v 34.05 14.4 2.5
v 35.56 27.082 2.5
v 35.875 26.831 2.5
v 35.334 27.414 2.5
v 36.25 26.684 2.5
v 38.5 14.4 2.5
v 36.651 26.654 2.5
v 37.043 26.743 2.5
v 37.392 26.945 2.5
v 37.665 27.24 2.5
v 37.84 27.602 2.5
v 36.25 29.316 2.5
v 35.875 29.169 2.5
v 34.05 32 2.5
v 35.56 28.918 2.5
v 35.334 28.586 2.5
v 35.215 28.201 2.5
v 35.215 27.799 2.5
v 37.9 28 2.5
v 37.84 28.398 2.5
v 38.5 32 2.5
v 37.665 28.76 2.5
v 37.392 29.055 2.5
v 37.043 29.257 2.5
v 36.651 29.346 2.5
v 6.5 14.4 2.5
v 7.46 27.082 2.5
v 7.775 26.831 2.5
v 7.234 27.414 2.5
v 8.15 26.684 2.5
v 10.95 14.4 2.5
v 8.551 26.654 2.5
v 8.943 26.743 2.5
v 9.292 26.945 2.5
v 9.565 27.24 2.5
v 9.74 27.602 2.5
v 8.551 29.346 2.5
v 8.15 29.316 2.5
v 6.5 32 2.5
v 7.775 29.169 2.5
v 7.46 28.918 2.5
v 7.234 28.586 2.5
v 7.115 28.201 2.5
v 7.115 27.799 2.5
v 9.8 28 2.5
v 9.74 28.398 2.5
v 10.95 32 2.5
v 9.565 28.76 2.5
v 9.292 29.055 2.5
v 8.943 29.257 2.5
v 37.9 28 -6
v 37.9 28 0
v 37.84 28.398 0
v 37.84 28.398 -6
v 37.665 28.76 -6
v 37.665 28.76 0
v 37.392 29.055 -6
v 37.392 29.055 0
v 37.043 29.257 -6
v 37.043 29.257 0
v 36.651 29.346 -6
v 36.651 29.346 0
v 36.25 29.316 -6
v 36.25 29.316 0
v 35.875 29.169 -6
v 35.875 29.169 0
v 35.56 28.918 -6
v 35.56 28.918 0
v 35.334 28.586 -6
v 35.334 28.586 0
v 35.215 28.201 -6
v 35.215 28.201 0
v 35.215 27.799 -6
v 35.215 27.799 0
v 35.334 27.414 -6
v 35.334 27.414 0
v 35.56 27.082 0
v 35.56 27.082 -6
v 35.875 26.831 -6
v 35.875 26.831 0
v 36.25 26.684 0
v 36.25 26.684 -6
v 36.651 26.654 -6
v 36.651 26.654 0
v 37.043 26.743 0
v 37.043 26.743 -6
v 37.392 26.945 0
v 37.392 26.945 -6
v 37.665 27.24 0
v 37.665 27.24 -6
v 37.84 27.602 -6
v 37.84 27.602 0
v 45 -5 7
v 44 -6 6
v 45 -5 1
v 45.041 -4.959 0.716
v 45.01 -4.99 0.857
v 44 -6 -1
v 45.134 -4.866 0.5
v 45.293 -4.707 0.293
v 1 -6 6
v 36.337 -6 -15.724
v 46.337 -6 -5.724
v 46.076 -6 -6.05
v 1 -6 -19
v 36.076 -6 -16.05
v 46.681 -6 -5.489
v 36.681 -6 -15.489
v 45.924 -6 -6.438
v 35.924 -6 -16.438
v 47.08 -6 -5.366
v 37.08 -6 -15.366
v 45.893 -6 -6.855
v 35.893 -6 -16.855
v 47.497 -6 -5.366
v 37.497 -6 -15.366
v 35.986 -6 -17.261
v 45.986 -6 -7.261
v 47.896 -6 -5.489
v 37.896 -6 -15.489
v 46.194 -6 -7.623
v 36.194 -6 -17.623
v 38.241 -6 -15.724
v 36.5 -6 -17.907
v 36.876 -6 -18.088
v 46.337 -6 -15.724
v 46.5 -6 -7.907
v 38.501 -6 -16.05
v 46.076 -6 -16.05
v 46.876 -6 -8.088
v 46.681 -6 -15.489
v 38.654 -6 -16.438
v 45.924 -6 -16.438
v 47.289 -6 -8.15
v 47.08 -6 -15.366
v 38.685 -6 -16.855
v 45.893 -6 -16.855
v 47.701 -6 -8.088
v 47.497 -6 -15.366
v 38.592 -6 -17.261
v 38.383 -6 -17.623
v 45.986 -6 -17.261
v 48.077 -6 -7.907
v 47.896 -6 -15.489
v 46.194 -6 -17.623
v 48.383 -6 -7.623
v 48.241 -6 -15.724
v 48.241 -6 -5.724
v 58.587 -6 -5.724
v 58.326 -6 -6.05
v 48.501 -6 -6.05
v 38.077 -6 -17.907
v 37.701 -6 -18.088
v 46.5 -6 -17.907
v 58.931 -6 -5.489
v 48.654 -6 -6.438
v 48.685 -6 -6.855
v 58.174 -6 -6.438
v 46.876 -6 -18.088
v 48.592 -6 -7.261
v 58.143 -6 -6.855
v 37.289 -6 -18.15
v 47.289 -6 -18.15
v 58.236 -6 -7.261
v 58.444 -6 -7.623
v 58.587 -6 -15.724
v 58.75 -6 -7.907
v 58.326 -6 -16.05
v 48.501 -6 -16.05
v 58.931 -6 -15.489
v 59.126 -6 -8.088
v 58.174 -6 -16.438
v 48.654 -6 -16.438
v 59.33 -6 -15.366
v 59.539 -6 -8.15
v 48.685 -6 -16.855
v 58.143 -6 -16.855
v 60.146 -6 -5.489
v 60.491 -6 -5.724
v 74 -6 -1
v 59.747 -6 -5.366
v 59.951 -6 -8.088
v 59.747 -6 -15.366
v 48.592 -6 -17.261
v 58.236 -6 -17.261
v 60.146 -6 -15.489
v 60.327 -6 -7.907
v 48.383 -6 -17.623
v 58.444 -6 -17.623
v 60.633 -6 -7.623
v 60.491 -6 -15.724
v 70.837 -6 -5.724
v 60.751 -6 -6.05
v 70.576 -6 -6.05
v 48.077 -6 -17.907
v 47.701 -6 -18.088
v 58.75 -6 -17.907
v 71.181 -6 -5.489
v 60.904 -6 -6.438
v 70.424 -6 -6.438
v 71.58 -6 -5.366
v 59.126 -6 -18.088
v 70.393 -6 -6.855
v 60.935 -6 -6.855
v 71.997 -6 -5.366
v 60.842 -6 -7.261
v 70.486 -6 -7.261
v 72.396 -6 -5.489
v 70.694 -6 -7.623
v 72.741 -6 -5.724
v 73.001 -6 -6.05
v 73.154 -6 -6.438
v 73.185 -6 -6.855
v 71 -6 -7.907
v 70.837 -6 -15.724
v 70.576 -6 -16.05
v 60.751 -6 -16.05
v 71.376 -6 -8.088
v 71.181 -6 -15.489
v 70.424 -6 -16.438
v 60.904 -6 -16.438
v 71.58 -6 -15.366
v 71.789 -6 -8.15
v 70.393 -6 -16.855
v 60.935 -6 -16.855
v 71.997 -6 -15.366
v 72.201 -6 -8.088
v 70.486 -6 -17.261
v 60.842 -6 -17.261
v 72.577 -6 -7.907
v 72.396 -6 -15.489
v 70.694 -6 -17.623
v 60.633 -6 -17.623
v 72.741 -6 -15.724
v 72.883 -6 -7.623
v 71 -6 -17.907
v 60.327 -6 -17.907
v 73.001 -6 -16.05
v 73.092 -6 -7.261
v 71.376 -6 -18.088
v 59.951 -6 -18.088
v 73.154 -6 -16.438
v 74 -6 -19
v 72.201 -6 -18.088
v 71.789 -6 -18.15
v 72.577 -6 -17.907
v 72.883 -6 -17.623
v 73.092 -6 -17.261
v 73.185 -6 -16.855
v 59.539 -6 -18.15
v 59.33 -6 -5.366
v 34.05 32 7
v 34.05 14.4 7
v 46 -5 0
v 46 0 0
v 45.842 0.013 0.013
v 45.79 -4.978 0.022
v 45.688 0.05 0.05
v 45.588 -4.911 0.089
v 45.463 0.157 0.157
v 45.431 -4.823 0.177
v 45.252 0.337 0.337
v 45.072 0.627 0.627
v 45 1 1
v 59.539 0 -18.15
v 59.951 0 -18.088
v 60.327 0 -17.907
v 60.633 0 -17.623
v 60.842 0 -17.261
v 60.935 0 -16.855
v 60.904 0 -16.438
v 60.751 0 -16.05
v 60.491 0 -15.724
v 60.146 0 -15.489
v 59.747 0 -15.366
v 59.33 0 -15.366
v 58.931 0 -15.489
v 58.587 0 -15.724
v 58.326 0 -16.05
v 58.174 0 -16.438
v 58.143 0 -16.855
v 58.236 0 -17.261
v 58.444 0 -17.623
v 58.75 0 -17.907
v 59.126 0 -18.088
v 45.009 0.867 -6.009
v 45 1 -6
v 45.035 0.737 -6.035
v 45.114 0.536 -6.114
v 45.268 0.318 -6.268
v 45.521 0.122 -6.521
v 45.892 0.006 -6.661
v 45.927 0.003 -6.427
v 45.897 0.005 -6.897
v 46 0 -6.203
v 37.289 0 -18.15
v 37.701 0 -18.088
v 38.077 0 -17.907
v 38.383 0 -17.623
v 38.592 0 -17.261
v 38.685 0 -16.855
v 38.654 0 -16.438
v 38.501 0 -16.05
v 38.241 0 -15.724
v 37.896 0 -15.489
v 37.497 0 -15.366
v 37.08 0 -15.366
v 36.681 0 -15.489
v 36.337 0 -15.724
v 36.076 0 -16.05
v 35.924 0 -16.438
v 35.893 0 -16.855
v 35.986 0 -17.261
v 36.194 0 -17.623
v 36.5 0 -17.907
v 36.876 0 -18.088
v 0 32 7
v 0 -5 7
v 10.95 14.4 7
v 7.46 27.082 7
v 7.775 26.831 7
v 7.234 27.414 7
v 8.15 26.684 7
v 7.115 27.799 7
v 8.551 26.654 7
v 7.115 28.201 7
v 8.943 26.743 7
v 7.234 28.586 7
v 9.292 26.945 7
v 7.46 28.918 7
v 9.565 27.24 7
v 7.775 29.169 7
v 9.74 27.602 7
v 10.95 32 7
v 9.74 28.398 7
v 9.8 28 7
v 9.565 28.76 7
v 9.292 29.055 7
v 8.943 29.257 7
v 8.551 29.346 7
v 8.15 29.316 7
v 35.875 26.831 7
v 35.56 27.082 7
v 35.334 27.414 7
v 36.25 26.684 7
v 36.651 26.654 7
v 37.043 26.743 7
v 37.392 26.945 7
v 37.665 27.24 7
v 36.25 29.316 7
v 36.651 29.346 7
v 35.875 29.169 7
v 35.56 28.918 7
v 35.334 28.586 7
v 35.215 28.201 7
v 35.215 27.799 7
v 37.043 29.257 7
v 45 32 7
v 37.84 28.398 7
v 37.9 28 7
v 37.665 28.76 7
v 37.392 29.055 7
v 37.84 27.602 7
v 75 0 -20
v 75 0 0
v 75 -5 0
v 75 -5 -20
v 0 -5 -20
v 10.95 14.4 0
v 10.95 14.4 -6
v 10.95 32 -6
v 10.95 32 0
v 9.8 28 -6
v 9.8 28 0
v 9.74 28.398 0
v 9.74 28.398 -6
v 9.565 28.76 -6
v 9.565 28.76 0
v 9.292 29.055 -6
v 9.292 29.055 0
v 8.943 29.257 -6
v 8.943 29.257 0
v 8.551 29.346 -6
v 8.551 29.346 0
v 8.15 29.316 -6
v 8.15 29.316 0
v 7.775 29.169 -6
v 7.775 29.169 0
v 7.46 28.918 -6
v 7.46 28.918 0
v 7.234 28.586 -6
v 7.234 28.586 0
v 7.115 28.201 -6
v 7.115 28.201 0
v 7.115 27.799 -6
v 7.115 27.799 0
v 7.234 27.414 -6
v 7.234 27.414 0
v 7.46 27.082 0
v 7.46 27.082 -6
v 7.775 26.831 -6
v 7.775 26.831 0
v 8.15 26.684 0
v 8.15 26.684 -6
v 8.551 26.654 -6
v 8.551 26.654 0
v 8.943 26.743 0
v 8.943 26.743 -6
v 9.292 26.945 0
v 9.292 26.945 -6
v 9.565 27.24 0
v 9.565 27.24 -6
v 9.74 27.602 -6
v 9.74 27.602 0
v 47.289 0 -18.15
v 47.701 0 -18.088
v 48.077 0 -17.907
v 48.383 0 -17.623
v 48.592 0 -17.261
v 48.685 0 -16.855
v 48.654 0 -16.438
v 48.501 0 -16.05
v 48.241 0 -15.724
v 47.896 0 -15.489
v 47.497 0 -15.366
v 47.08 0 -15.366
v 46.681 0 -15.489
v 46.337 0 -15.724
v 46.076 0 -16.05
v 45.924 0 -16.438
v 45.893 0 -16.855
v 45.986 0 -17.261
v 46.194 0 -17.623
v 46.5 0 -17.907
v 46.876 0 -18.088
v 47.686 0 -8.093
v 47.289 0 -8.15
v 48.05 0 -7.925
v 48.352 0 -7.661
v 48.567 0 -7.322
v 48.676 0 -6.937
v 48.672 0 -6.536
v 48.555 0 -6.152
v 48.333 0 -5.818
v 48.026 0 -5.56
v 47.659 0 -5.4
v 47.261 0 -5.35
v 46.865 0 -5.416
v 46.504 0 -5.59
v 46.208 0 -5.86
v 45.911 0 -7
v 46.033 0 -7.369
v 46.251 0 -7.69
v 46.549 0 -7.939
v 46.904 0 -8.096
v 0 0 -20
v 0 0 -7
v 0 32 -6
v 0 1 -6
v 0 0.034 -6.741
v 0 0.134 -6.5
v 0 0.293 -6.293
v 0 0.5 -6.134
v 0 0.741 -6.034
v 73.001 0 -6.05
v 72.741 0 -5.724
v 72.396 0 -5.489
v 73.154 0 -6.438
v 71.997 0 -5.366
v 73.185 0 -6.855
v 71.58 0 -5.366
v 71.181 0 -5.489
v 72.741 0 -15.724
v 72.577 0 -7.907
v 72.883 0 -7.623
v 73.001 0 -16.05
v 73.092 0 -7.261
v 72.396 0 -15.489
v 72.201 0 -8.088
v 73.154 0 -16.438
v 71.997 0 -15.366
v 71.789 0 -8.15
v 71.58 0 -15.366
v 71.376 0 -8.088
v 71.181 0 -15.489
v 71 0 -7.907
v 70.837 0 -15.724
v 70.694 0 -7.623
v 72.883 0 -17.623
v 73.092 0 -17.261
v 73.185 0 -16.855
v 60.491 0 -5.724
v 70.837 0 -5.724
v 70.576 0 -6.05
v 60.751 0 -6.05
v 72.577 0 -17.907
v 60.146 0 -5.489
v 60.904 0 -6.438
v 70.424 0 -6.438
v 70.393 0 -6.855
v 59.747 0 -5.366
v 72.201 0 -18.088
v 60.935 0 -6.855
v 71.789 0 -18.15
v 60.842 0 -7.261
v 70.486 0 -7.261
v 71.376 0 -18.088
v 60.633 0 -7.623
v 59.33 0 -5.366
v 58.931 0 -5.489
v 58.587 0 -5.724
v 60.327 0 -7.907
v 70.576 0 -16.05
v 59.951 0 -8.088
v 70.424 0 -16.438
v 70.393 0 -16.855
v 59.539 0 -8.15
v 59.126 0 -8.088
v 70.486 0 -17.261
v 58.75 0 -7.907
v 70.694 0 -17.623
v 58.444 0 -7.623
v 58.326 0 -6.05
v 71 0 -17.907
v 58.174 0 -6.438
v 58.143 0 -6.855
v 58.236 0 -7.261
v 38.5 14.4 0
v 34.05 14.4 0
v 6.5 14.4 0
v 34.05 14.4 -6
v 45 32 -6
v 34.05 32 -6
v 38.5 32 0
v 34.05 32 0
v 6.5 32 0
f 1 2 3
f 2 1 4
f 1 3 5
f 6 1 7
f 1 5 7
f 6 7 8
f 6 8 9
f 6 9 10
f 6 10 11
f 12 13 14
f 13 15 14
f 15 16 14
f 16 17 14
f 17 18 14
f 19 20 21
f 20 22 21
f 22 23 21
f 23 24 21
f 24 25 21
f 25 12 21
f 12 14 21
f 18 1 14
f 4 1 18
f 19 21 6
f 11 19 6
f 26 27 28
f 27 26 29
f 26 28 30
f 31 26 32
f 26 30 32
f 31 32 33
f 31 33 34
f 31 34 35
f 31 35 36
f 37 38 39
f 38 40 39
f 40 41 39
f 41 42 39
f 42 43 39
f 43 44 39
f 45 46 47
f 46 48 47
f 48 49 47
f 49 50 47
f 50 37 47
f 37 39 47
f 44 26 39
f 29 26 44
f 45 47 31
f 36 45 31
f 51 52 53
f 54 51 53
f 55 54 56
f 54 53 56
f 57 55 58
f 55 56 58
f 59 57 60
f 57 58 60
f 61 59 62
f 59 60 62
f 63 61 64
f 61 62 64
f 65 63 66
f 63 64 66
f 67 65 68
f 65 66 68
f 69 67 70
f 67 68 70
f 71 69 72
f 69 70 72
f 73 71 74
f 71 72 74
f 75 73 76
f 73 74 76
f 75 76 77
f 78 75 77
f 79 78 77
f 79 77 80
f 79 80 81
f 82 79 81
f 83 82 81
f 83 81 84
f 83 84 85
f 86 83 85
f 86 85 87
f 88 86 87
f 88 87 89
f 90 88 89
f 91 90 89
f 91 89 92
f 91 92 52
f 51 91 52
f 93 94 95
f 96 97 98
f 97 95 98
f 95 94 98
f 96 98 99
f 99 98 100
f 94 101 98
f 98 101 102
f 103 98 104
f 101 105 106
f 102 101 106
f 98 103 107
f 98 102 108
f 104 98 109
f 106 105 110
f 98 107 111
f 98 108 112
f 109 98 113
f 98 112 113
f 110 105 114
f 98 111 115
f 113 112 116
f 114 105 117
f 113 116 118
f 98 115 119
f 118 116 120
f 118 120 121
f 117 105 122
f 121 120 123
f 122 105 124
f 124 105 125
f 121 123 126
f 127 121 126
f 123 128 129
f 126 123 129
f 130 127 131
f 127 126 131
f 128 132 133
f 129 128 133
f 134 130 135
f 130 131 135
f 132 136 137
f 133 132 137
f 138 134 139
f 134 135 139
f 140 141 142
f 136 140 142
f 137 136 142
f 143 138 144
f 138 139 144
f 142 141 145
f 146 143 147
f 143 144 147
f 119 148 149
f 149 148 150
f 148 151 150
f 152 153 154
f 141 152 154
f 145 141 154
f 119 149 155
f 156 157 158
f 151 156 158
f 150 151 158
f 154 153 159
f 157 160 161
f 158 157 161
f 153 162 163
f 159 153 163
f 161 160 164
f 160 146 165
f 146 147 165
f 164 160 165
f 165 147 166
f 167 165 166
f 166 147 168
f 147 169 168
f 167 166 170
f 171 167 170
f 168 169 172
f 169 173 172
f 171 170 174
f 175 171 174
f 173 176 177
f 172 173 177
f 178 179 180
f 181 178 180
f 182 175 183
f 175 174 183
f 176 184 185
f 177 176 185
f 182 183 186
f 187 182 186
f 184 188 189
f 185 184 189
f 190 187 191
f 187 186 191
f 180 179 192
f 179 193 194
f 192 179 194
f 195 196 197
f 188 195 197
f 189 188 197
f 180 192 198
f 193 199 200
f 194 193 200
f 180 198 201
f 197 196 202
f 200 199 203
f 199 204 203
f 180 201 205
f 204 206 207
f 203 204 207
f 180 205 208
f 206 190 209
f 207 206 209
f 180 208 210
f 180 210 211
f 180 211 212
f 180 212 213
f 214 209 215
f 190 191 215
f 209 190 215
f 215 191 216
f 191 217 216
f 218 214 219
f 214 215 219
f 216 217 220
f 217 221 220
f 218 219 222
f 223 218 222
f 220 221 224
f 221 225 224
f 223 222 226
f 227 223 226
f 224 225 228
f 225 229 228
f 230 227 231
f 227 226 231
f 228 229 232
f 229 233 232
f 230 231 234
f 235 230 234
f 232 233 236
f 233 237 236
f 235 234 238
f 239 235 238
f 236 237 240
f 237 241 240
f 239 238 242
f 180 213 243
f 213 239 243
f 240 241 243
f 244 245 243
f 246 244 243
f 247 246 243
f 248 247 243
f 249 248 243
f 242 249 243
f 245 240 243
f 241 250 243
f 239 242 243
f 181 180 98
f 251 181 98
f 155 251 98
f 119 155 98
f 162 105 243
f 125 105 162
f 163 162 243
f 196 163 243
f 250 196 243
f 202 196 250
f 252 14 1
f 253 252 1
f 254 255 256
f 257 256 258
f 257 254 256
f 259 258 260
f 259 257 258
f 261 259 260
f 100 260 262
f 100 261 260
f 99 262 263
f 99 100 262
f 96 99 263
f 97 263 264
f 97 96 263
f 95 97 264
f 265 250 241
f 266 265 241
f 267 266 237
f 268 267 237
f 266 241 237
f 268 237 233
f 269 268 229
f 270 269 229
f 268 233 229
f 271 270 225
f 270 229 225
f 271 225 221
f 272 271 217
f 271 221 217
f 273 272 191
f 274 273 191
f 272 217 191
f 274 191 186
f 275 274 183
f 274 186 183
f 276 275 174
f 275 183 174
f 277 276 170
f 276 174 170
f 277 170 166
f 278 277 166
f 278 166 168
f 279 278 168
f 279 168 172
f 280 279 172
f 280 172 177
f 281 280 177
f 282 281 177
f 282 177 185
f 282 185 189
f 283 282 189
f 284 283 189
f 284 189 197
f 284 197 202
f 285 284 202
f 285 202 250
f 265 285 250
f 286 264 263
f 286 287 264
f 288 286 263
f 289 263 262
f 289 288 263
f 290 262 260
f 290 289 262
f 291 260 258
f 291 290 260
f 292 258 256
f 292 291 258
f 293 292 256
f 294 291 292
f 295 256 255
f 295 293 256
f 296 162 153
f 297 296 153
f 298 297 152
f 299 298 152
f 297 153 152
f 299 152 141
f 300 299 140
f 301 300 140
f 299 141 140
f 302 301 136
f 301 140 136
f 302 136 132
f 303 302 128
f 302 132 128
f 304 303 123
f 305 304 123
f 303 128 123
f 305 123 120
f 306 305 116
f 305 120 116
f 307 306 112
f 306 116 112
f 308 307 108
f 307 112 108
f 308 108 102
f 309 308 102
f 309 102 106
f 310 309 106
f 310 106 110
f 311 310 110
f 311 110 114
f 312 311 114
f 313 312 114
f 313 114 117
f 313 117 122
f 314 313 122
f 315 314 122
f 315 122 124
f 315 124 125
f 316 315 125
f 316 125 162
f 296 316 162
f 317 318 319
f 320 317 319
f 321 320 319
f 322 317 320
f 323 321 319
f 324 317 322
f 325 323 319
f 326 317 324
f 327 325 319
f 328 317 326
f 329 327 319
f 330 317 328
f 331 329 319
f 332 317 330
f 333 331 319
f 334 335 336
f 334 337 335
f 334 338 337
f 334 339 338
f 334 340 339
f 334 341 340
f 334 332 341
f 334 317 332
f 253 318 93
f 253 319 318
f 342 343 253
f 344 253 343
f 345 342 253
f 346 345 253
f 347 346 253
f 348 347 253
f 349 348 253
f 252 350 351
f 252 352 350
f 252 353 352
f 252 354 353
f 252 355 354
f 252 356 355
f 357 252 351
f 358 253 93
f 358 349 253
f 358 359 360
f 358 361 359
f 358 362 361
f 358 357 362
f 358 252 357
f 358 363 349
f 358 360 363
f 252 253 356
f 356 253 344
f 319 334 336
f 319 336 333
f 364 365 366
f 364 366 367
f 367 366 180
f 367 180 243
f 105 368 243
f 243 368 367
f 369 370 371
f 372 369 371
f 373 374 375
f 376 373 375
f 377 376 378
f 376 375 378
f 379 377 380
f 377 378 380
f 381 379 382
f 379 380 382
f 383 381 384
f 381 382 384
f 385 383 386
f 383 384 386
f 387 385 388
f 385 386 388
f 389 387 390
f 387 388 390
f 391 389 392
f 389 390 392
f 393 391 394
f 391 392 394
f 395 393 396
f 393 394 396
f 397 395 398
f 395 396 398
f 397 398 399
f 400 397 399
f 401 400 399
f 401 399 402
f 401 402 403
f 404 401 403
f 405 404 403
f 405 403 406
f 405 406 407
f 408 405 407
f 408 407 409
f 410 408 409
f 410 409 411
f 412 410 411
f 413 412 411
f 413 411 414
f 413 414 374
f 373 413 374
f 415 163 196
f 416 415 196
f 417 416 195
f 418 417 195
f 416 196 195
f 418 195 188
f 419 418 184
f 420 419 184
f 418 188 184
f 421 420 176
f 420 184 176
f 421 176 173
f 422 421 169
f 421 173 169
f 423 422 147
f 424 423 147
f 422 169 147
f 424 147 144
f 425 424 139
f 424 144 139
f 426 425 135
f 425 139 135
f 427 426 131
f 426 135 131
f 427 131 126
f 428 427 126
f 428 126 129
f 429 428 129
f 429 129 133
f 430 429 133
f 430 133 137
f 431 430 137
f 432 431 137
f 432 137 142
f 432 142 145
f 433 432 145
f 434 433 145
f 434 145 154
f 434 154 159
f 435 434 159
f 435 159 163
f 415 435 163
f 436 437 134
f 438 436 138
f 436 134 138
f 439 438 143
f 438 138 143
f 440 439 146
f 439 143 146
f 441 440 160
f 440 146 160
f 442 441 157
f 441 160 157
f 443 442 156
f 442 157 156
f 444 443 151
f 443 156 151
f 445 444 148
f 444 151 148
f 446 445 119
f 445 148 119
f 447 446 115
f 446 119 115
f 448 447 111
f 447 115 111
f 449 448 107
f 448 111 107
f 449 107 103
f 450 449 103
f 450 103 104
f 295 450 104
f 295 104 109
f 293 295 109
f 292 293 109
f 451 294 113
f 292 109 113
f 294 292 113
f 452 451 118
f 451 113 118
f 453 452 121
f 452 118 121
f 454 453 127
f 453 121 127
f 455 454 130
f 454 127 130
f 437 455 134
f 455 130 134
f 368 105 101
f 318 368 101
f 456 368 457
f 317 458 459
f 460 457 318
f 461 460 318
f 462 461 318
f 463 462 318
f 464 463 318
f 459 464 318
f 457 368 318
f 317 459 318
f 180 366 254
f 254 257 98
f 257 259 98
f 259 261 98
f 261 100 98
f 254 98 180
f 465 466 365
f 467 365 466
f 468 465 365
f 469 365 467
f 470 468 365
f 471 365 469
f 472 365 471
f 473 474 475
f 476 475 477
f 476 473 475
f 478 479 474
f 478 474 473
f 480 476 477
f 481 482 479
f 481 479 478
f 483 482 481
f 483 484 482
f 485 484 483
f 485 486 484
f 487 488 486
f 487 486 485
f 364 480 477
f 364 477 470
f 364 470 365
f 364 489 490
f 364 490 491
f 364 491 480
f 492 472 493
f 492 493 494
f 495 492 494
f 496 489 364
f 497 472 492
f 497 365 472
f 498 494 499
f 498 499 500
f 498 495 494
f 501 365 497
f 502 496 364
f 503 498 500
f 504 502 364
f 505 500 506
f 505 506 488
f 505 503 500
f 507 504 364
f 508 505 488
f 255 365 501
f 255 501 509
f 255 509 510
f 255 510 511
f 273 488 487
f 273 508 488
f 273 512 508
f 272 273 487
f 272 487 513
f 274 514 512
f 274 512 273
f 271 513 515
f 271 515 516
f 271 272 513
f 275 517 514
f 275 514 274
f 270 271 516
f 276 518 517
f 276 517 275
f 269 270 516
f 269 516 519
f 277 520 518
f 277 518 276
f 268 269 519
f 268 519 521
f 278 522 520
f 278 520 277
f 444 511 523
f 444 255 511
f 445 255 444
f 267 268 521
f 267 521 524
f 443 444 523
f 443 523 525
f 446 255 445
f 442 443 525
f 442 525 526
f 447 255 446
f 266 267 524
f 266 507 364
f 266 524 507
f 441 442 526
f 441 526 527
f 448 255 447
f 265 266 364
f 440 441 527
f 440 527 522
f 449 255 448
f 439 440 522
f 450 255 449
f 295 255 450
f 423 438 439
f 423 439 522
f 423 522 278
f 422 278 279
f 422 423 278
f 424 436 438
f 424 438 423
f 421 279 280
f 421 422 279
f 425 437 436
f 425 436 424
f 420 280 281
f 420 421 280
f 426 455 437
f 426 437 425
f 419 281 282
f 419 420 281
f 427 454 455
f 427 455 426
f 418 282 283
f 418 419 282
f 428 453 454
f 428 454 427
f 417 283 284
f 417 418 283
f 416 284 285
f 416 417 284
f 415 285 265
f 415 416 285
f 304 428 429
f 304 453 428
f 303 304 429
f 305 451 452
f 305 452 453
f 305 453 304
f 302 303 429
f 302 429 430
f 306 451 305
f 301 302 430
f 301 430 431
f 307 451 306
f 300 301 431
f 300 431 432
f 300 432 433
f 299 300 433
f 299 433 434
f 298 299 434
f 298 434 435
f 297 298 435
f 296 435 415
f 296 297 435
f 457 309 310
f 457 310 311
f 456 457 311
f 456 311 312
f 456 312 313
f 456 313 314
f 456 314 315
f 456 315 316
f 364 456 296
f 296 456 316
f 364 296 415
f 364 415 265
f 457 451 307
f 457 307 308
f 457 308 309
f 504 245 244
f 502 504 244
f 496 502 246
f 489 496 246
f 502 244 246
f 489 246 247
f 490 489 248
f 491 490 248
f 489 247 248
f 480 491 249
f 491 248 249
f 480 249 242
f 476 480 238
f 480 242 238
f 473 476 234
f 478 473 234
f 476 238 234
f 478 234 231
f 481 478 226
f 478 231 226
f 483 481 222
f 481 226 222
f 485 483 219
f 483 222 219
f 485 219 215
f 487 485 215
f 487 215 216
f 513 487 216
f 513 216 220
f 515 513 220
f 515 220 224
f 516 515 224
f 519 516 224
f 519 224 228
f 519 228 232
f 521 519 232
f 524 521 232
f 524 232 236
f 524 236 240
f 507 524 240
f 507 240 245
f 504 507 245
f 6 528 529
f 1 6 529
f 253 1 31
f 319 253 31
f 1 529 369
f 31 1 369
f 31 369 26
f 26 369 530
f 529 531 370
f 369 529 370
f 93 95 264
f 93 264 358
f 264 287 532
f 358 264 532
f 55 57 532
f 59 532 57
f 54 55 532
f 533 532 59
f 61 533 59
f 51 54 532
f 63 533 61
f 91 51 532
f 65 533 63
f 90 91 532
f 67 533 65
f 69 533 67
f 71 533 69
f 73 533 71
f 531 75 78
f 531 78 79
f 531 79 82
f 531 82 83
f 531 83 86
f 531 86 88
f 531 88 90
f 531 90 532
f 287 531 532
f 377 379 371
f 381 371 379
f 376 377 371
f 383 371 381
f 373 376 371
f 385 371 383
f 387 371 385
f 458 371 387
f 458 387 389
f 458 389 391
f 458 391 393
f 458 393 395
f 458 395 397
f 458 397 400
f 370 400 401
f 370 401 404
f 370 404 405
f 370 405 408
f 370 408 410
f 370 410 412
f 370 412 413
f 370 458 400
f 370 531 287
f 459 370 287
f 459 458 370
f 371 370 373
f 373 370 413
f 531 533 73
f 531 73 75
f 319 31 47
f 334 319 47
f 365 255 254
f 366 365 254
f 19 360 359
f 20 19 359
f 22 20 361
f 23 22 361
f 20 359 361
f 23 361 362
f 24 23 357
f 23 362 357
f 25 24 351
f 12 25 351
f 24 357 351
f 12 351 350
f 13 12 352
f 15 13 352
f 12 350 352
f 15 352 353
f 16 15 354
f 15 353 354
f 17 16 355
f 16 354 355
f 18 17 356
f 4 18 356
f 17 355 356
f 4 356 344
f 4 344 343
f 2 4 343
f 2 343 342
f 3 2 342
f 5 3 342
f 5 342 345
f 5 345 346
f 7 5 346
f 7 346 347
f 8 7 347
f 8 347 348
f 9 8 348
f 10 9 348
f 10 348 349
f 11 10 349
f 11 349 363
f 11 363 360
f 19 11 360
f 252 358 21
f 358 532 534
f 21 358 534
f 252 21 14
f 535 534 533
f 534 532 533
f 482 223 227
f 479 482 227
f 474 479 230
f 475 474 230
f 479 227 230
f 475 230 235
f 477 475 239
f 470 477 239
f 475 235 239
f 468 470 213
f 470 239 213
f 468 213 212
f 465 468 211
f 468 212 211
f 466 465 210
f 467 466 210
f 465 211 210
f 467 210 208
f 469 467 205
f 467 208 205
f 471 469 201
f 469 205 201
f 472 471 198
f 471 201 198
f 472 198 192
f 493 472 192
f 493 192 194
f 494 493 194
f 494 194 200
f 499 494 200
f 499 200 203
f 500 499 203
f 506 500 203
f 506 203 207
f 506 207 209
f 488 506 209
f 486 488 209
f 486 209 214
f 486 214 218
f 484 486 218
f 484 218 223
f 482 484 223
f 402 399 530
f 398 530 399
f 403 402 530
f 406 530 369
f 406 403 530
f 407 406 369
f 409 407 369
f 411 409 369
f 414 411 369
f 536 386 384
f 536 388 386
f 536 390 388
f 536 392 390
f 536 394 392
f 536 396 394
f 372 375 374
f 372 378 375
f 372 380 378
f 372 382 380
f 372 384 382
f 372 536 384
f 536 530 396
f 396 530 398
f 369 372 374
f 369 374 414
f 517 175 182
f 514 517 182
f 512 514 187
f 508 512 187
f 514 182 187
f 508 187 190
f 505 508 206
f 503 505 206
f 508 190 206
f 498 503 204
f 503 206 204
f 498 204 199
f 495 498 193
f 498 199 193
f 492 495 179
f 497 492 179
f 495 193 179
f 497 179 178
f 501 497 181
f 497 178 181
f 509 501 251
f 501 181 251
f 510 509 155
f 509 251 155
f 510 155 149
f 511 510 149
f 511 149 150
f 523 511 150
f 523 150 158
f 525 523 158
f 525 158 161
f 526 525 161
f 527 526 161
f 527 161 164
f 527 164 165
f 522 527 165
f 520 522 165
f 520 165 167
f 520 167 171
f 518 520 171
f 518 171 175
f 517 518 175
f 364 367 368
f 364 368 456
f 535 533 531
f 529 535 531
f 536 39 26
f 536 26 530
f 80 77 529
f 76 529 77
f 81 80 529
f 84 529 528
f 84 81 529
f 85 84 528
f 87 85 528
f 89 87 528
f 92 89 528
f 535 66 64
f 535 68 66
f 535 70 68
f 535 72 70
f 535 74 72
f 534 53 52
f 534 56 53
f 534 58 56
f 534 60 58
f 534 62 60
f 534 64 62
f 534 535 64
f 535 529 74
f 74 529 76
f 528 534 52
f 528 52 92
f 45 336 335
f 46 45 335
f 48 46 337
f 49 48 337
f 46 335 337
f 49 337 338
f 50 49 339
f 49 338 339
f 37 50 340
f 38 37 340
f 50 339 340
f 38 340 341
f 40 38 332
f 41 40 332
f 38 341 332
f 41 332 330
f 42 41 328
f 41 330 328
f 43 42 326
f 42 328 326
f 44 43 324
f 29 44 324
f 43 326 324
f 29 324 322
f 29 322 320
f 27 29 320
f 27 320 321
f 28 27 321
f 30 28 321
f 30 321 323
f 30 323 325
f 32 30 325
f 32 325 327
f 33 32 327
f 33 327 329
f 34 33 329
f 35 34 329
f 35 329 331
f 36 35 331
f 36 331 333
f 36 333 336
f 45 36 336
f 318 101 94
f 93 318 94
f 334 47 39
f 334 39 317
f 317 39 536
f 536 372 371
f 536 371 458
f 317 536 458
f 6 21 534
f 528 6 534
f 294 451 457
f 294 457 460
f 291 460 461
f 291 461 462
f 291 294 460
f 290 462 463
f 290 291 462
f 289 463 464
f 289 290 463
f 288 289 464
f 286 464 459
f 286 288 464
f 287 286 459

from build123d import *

# Parameters (mm, degrees)
SKETCH1_W           = 45
SKETCH1_H           = 6
BOSS_EXTRUDE1_DEPTH = 32
SKETCH2_W           = 23.1
SKETCH2_H           = 17.6
CUT_EXTRUDE1_DEPTH  = 56.542776308
SKETCH3_W           = 45
SKETCH3_H           = 20
BOSS_EXTRUDE2_DEPTH = 6
SKETCH4_W           = 20
SKETCH4_H           = 6
BOSS_EXTRUDE3_DEPTH = 30
SKETCH5_R           = 1.4
CUT_EXTRUDE2_DEPTH  = 87.423376467
BOSS_EXTRUDE4_DEPTH = 7
SKETCH7_W           = 32
SKETCH7_H           = 2.5
CUT_EXTRUDE3_DEPTH  = 17.6
SKETCH8_R           = 1.35
CUT_EXTRUDE4_DEPTH  = 86.895285086
CHAMFER1_SIZE       = 1
FILLET1_R           = 1


with BuildPart() as part:
    # Sketch1 → Boss-Extrude1 (new body)
    with BuildSketch(Plane(origin=(0, 0, 0), x_dir=(1, 0, 0), z_dir=(0, 1, 0))):
        with Locations((22.5, 3)):
            Rectangle(SKETCH1_W, SKETCH1_H)
    extrude(amount=BOSS_EXTRUDE1_DEPTH)

    # Sketch2 → Cut-Extrude1 (cut, through all)
    with BuildSketch(Plane.XY):
        with Locations((22.5, 23.2)):
            Rectangle(SKETCH2_W, SKETCH2_H)
    extrude(amount=-CUT_EXTRUDE1_DEPTH, mode=Mode.SUBTRACT)

    # Sketch3 → Boss-Extrude2 (add)
    with BuildSketch(Plane.XZ):
        with Locations((22.5, -10)):
            Rectangle(SKETCH3_W, SKETCH3_H)
    extrude(amount=BOSS_EXTRUDE2_DEPTH)

    # Sketch4 → Boss-Extrude3 (add)
    with BuildSketch(Plane(origin=(45, 0, 0), x_dir=(0, 0, -1), z_dir=(1, 0, 0))):
        with Locations((10, -3)):
            Rectangle(SKETCH4_W, SKETCH4_H)
    extrude(amount=BOSS_EXTRUDE3_DEPTH)

    # Sketch5 → Cut-Extrude2 (cut, through all)
    with BuildSketch(Plane.XZ.offset(6)):
        with Locations(Location((37.288839919, -16.75, 0), (0, 0, 270))):
            Circle(SKETCH5_R)
        with Locations(Location((47.288839919, -16.75, 0), (0, 0, 270))):
            Circle(SKETCH5_R)
        with Locations(Location((47.288839919, -6.75, 0), (0, 0, 270))):
            Circle(SKETCH5_R)
        with Locations(Location((59.538839919, -16.75, 0), (0, 0, 270))):
            Circle(SKETCH5_R)
        with Locations(Location((71.788839919, -16.75, 0), (0, 0, 270))):
            Circle(SKETCH5_R)
        with Locations(Location((71.788839919, -6.75, 0), (0, 0, 270))):
            Circle(SKETCH5_R)
        with Locations(Location((59.538839919, -6.75, 0), (0, 0, 270))):
            Circle(SKETCH5_R)
    extrude(amount=-CUT_EXTRUDE2_DEPTH, mode=Mode.SUBTRACT)

    # Sketch6 → Boss-Extrude4 (add)
    with BuildSketch(Plane.XY):
        Polygon((0, 32), (0, -6), (45, -6), (45, 0), (45, 32), (34.05, 32), (34.05, 14.4), (10.95, 14.4), (10.95, 32), align=None)
    extrude(amount=BOSS_EXTRUDE4_DEPTH)

    # Sketch7 → Cut-Extrude3 (cut)
    with BuildSketch(Plane(origin=(0, 32, 0), x_dir=(1, 0, 0), z_dir=(0, 1, 0))):
        with Locations((22.5, -1.25)):
            Rectangle(SKETCH7_W, SKETCH7_H)
    extrude(amount=-CUT_EXTRUDE3_DEPTH, mode=Mode.SUBTRACT)

    # Sketch8 → Cut-Extrude4 (cut, through all)
    with BuildSketch(Plane.XY.offset(7)):
        with Locations((8.45, 28)):
            Circle(SKETCH8_R)
        with Locations((36.55, 28)):
            Circle(SKETCH8_R)
    extrude(amount=-CUT_EXTRUDE4_DEPTH, mode=Mode.SUBTRACT)

    # Chamfer1
    chamfer1_edges = [part.edges().sort_by_distance(p)[0] for p in [
        (22.5, -6, 7),
        (0, -6, -6.5),
        (37.5, -6, -20),
        (60, -6, 0),
        (75, -6, -10),
        (45, -6, 3.5),
    ]]
    chamfer(chamfer1_edges, length=CHAMFER1_SIZE)

    # Fillet1
    # the kernel refuses this fillet: 1 mm, written as the material it adds along each edge
    with BuildSketch(Plane(origin=(45, 0, -6), x_dir=(0, 1, 0), z_dir=(0, 0, 1))) as fillet1_piece_1:
        with BuildLine():
            CenterArc((FILLET1_R, -FILLET1_R), FILLET1_R, 90, 90)
            Line((0, -FILLET1_R), (0, 0))
            Line((0, 0), (FILLET1_R, 0))
        make_face()
    extrude(amount=6)
    with BuildSketch(Plane(origin=(45, 0, -6), x_dir=(0, 0, -1), z_dir=(-1, 0, 0))) as fillet1_piece_2:
        with BuildLine():
            CenterArc((FILLET1_R, -FILLET1_R), FILLET1_R, 90, 90)
            Line((0, -FILLET1_R), (0, 0))
            Line((0, 0), (FILLET1_R, 0))
        make_face()
    extrude(amount=45)
    with BuildSketch(Plane(origin=(45, -7.5, 0), x_dir=(1, 0, 0), z_dir=(0, 1, 0))) as fillet1_piece_3_section:
        with BuildLine():
            CenterArc((FILLET1_R, -FILLET1_R), FILLET1_R, 90, 90)
            Line((0, -FILLET1_R), (0, 0))
            Line((0, 0), (FILLET1_R, 0))
        make_face()
    fillet1_piece_3 = extrude(amount=7.5, mode=Mode.PRIVATE)
    fillet1_piece_3 = split(fillet1_piece_3, bisect_by=Plane(origin=(45.042981958, -4.592558865, 0.407441135), z_dir=(0, -0.7071067811865476, 0.7071067811865476)), keep=Keep.TOP, mode=Mode.PRIVATE)
    fillet1_piece_3 = split(fillet1_piece_3, bisect_by=Plane(origin=(45.16446835, -4.83553165, 0.528927527), z_dir=(-0.7071067811865476, 0.7071067811865476, 0)), keep=Keep.TOP, mode=Mode.PRIVATE)
    add(fillet1_piece_3)
    with BuildSketch(Plane(origin=(45, -7.5, 0), x_dir=(1, 0, 0), z_dir=(0, 1, 0))) as fillet1_piece_4_section:
        with BuildLine():
            CenterArc((FILLET1_R, -FILLET1_R), FILLET1_R, 90, 90)
            Line((0, -FILLET1_R), (0, 0))
            Line((0, 0), (FILLET1_R, 0))
        make_face()
    fillet1_piece_4 = extrude(amount=7.5, mode=Mode.PRIVATE)
    fillet1_piece_4 = split(fillet1_piece_4, bisect_by=Plane(origin=(45.528927527, -4.83553165, 0.16446835), z_dir=(0, 0.7071067811865476, -0.7071067811865476)), keep=Keep.TOP, mode=Mode.PRIVATE)
    fillet1_piece_4 = split(fillet1_piece_4, bisect_by=Plane(origin=(45.407441135, -4.592558865, 0.042981958), z_dir=(0.7071067811865476, -0.7071067811865476, 0)), keep=Keep.TOP, mode=Mode.PRIVATE)
    add(fillet1_piece_4)
    with BuildSketch(Plane(origin=(45, -7.5, 0), x_dir=(1, 0, 0), z_dir=(0, 1, 0))) as fillet1_piece_5_section:
        with BuildLine():
            CenterArc((FILLET1_R, -FILLET1_R), FILLET1_R, 90, 90)
            Line((0, -FILLET1_R), (0, 0))
            Line((0, 0), (FILLET1_R, 0))
        make_face()
    fillet1_piece_5 = extrude(amount=7.5, mode=Mode.PRIVATE)
    fillet1_piece_5 = split(fillet1_piece_5, bisect_by=Plane(origin=(45.222376568, -3.546419499, 1.453580501), z_dir=(0, 0.7071067811865476, -0.7071067811865476)), keep=Keep.TOP, mode=Mode.PRIVATE)
    fillet1_piece_5 = split(fillet1_piece_5, bisect_by=Plane(origin=(46.453580501, -3.546419499, 0.222376568), z_dir=(-0.7071067811865476, 0.7071067811865476, 0)), keep=Keep.TOP, mode=Mode.PRIVATE)
    add(fillet1_piece_5)
    with BuildSketch(Plane(origin=(45, 0, -8.5), x_dir=(0, 1, 0), z_dir=(0, 0, 1))) as fillet1_piece_6a_section:
        with BuildLine():
            CenterArc((FILLET1_R, -FILLET1_R), FILLET1_R, 90, 90)
            Line((0, -FILLET1_R), (0, 0))
            Line((0, 0), (FILLET1_R, 0))
        make_face()
    fillet1_piece_6a = extrude(amount=8.5, mode=Mode.PRIVATE)
    fillet1_piece_6a = split(fillet1_piece_6a, bisect_by=Plane(origin=(45.224393795, 0.227043758, -6), z_dir=(0, 0, -1)), keep=Keep.TOP, mode=Mode.PRIVATE)
    fillet1_piece_6a = fillet1_piece_6a - Plane(origin=(47.288839919, 0.227043758, -6.75), x_dir=(0, 0, -1), z_dir=(0, -1, 0)) * Cylinder(1.4, 21, mode=Mode.PRIVATE)
    with BuildSketch(Plane(origin=(47.5, 0, -6), x_dir=(0, 0, -1), z_dir=(-1, 0, 0))) as fillet1_piece_6b_section:
        with BuildLine():
            CenterArc((FILLET1_R, -FILLET1_R), FILLET1_R, 90, 90)
            Line((0, -FILLET1_R), (0, 0))
            Line((0, 0), (FILLET1_R, 0))
        make_face()
    fillet1_piece_6b = extrude(amount=47.5, mode=Mode.PRIVATE)
    fillet1_piece_6b = split(fillet1_piece_6b, bisect_by=Plane(origin=(45, 0.236066937, -6.212082633), z_dir=(1, 0, 0)), keep=Keep.TOP, mode=Mode.PRIVATE)
    fillet1_piece_6b = fillet1_piece_6b - Plane(origin=(47.288839919, 0.236066937, -6.75), x_dir=(0, 0, -1), z_dir=(0, -1, 0)) * Cylinder(1.4, 99, mode=Mode.PRIVATE)
    fillet1_piece_6 = fillet1_piece_6a & fillet1_piece_6b
    add(fillet1_piece_6)
    with BuildSketch(Plane(origin=(45, -7.5, 0), x_dir=(1, 0, 0), z_dir=(0, 1, 0))) as fillet1_piece_7a_section:
        with BuildLine():
            CenterArc((FILLET1_R, -FILLET1_R), FILLET1_R, 90, 90)
            Line((0, -FILLET1_R), (0, 0))
            Line((0, 0), (FILLET1_R, 0))
        make_face()
    fillet1_piece_7a = extrude(amount=10, mode=Mode.PRIVATE)
    fillet1_piece_7a = split(fillet1_piece_7a, bisect_by=Plane(origin=(45.226395114, 0, 0.226395114), z_dir=(0, 1, 0)), keep=Keep.TOP, mode=Mode.PRIVATE)
    with BuildSketch(Plane(origin=(45, 0, -6), x_dir=(0, 1, 0), z_dir=(0, 0, 1))) as fillet1_piece_7b_section:
        with BuildLine():
            CenterArc((FILLET1_R, -FILLET1_R), FILLET1_R, 90, 90)
            Line((0, -FILLET1_R), (0, 0))
            Line((0, 0), (FILLET1_R, 0))
        make_face()
    fillet1_piece_7b = extrude(amount=8.5, mode=Mode.PRIVATE)
    fillet1_piece_7b = split(fillet1_piece_7b, bisect_by=Plane(origin=(45.226395114, 0.226395114, 0), z_dir=(0, 0, 1)), keep=Keep.TOP, mode=Mode.PRIVATE)
    fillet1_piece_7 = fillet1_piece_7a & fillet1_piece_7b
    add(fillet1_piece_7)


solid = part.part
